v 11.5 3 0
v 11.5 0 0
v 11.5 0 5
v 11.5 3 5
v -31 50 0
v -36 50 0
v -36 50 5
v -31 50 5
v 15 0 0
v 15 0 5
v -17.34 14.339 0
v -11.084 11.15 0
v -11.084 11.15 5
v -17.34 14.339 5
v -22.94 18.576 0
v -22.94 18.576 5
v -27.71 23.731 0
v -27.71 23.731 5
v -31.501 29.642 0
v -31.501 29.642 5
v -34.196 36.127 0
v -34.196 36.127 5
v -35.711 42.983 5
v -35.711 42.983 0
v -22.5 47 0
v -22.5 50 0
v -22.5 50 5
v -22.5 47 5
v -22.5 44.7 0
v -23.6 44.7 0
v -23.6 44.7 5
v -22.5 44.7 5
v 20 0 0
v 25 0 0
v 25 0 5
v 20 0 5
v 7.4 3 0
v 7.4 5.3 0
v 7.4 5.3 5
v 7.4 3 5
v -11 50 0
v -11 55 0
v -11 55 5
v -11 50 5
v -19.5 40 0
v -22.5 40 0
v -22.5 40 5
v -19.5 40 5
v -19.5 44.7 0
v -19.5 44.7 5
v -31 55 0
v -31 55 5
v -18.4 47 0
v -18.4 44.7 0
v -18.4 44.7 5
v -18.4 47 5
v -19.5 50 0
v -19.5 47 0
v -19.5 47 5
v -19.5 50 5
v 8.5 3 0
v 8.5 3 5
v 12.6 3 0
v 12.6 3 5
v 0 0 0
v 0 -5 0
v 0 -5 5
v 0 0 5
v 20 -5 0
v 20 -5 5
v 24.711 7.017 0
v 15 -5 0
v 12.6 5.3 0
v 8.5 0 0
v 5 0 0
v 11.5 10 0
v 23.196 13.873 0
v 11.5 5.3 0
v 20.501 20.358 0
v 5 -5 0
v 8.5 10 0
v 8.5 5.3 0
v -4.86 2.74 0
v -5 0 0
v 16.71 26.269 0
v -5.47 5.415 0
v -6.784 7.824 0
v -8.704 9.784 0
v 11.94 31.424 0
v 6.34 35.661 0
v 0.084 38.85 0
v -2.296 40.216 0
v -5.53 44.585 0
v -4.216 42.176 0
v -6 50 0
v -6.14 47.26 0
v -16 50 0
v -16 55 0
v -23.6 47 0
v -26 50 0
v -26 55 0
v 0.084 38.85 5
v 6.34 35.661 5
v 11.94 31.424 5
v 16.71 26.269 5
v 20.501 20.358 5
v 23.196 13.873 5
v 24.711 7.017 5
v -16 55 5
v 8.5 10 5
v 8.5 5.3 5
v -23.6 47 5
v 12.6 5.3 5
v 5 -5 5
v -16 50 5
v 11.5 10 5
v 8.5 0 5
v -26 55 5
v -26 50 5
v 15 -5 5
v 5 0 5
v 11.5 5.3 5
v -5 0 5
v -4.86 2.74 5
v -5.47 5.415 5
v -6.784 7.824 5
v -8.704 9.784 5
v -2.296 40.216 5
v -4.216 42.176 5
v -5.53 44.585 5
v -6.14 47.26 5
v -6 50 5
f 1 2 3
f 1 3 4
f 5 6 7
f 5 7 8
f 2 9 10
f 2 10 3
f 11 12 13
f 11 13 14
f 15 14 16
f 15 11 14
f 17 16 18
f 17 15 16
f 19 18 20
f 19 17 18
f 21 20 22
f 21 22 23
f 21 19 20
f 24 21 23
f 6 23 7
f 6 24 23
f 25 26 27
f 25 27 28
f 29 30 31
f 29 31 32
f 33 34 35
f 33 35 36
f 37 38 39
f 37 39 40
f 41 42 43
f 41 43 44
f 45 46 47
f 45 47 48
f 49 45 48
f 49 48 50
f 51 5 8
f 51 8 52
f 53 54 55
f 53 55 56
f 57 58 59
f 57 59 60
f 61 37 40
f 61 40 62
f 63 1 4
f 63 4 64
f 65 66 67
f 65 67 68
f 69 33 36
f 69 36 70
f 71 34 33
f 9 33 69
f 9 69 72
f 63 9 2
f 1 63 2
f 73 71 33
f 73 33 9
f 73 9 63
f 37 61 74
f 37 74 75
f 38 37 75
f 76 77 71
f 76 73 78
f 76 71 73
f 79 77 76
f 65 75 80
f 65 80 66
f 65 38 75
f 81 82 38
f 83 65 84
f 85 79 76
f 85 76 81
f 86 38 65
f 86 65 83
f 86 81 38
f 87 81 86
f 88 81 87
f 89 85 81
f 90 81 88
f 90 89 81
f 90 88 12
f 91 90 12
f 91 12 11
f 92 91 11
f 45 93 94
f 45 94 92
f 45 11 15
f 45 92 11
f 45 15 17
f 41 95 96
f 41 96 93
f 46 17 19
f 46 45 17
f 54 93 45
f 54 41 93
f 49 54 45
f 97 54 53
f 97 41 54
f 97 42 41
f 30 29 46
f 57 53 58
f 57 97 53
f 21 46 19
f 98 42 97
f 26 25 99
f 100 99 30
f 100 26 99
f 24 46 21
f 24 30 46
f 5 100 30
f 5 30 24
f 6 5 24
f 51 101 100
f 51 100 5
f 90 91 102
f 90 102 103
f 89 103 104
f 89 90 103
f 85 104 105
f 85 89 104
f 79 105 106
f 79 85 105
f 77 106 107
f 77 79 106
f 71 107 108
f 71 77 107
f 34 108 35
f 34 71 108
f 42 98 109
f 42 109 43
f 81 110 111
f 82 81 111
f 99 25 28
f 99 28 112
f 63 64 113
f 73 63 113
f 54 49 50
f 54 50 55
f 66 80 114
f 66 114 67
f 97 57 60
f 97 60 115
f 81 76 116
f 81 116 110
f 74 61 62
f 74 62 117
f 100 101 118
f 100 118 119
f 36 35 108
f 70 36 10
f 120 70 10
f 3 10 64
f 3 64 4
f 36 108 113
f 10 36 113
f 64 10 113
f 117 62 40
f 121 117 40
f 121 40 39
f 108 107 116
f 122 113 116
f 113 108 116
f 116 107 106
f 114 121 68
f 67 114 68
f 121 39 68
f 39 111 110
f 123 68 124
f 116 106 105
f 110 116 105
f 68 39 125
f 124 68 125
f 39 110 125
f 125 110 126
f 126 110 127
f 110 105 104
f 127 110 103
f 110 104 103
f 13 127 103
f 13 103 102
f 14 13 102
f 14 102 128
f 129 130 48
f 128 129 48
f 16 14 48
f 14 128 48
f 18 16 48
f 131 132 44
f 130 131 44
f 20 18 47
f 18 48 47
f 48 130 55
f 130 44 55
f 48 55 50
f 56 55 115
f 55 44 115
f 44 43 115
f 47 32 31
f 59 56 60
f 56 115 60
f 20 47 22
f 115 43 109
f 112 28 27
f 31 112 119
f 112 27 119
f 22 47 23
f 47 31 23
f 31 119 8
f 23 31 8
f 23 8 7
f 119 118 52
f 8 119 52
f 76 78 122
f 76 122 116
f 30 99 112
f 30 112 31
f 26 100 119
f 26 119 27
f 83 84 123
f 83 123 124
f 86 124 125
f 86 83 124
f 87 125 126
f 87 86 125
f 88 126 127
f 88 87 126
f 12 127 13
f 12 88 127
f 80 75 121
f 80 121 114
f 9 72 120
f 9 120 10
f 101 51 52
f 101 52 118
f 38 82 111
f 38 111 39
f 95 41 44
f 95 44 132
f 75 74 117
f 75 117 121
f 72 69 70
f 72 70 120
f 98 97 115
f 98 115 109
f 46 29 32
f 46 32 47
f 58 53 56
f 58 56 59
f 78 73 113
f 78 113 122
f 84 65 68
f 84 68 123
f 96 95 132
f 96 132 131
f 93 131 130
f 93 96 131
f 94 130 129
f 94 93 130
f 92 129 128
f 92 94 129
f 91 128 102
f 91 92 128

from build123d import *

# Parameters (mm, degrees)
BOSS_EXTRUDE1_DEPTH = 5


with BuildPart() as part:
    # Sketch1 → Boss-Extrude1 (new body)
    with BuildSketch(Plane.XY):
        with BuildLine():
            Line((-11, 50), (-6, 50))
            ThreePointArc((-6, 50), (-4.955689192, 43.335228836), (0.083613647, 38.850233113))
            ThreePointArc((0.083613647, 38.850233113), (18.735492032, 23.397402982), (25, 0))
            Line((25, 0), (20, 0))
            Line((20, 0), (20, -5))
            Line((20, -5), (15, -5))
            Line((15, -5), (15, 0))
            Line((15, 0), (11.5, 0))
            Line((11.5, 0), (11.5, 3))
            Line((11.5, 3), (12.6, 3))
            Line((12.6, 3), (12.6, 5.3))
            Line((12.6, 5.3), (11.5, 5.3))
            Line((11.5, 5.3), (11.5, 10))
            Line((11.5, 10), (8.5, 10))
            Line((8.5, 10), (8.5, 5.3))
            Line((8.5, 5.3), (7.4, 5.3))
            Line((7.4, 5.3), (7.4, 3))
            Line((7.4, 3), (8.5, 3))
            Line((8.5, 3), (8.5, 0))
            Line((8.5, 0), (5, 0))
            Line((5, 0), (5, -5))
            Line((5, -5), (0, -5))
            Line((0, -5), (0, 0))
            Line((0, 0), (-5, 0))
            ThreePointArc((-5, 0), (-6.044310808, 6.664771164), (-11.083613647, 11.149766887))
            ThreePointArc((-11.083613647, 11.149766887), (-29.735492032, 26.602597018), (-36, 50))
            Line((-36, 50), (-31, 50))
            Line((-31, 50), (-31, 55))
            Line((-31, 55), (-26, 55))
            Line((-26, 55), (-26, 50))
            Line((-26, 50), (-22.5, 50))
            Line((-22.5, 50), (-22.5, 47))
            Line((-22.5, 47), (-23.6, 47))
            Line((-23.6, 47), (-23.6, 44.7))
            Line((-23.6, 44.7), (-22.5, 44.7))
            Line((-22.5, 44.7), (-22.5, 40))
            Line((-22.5, 40), (-19.5, 40))
            Line((-19.5, 40), (-19.5, 44.7))
            Line((-19.5, 44.7), (-18.4, 44.7))
            Line((-18.4, 44.7), (-18.4, 47))
            Line((-18.4, 47), (-19.5, 47))
            Line((-19.5, 47), (-19.5, 50))
            Line((-19.5, 50), (-16, 50))
            Line((-16, 50), (-16, 55))
            Line((-16, 55), (-11, 55))
            Line((-11, 55), (-11, 50))
        make_face()
    extrude(amount=BOSS_EXTRUDE1_DEPTH)


solid = part.part
